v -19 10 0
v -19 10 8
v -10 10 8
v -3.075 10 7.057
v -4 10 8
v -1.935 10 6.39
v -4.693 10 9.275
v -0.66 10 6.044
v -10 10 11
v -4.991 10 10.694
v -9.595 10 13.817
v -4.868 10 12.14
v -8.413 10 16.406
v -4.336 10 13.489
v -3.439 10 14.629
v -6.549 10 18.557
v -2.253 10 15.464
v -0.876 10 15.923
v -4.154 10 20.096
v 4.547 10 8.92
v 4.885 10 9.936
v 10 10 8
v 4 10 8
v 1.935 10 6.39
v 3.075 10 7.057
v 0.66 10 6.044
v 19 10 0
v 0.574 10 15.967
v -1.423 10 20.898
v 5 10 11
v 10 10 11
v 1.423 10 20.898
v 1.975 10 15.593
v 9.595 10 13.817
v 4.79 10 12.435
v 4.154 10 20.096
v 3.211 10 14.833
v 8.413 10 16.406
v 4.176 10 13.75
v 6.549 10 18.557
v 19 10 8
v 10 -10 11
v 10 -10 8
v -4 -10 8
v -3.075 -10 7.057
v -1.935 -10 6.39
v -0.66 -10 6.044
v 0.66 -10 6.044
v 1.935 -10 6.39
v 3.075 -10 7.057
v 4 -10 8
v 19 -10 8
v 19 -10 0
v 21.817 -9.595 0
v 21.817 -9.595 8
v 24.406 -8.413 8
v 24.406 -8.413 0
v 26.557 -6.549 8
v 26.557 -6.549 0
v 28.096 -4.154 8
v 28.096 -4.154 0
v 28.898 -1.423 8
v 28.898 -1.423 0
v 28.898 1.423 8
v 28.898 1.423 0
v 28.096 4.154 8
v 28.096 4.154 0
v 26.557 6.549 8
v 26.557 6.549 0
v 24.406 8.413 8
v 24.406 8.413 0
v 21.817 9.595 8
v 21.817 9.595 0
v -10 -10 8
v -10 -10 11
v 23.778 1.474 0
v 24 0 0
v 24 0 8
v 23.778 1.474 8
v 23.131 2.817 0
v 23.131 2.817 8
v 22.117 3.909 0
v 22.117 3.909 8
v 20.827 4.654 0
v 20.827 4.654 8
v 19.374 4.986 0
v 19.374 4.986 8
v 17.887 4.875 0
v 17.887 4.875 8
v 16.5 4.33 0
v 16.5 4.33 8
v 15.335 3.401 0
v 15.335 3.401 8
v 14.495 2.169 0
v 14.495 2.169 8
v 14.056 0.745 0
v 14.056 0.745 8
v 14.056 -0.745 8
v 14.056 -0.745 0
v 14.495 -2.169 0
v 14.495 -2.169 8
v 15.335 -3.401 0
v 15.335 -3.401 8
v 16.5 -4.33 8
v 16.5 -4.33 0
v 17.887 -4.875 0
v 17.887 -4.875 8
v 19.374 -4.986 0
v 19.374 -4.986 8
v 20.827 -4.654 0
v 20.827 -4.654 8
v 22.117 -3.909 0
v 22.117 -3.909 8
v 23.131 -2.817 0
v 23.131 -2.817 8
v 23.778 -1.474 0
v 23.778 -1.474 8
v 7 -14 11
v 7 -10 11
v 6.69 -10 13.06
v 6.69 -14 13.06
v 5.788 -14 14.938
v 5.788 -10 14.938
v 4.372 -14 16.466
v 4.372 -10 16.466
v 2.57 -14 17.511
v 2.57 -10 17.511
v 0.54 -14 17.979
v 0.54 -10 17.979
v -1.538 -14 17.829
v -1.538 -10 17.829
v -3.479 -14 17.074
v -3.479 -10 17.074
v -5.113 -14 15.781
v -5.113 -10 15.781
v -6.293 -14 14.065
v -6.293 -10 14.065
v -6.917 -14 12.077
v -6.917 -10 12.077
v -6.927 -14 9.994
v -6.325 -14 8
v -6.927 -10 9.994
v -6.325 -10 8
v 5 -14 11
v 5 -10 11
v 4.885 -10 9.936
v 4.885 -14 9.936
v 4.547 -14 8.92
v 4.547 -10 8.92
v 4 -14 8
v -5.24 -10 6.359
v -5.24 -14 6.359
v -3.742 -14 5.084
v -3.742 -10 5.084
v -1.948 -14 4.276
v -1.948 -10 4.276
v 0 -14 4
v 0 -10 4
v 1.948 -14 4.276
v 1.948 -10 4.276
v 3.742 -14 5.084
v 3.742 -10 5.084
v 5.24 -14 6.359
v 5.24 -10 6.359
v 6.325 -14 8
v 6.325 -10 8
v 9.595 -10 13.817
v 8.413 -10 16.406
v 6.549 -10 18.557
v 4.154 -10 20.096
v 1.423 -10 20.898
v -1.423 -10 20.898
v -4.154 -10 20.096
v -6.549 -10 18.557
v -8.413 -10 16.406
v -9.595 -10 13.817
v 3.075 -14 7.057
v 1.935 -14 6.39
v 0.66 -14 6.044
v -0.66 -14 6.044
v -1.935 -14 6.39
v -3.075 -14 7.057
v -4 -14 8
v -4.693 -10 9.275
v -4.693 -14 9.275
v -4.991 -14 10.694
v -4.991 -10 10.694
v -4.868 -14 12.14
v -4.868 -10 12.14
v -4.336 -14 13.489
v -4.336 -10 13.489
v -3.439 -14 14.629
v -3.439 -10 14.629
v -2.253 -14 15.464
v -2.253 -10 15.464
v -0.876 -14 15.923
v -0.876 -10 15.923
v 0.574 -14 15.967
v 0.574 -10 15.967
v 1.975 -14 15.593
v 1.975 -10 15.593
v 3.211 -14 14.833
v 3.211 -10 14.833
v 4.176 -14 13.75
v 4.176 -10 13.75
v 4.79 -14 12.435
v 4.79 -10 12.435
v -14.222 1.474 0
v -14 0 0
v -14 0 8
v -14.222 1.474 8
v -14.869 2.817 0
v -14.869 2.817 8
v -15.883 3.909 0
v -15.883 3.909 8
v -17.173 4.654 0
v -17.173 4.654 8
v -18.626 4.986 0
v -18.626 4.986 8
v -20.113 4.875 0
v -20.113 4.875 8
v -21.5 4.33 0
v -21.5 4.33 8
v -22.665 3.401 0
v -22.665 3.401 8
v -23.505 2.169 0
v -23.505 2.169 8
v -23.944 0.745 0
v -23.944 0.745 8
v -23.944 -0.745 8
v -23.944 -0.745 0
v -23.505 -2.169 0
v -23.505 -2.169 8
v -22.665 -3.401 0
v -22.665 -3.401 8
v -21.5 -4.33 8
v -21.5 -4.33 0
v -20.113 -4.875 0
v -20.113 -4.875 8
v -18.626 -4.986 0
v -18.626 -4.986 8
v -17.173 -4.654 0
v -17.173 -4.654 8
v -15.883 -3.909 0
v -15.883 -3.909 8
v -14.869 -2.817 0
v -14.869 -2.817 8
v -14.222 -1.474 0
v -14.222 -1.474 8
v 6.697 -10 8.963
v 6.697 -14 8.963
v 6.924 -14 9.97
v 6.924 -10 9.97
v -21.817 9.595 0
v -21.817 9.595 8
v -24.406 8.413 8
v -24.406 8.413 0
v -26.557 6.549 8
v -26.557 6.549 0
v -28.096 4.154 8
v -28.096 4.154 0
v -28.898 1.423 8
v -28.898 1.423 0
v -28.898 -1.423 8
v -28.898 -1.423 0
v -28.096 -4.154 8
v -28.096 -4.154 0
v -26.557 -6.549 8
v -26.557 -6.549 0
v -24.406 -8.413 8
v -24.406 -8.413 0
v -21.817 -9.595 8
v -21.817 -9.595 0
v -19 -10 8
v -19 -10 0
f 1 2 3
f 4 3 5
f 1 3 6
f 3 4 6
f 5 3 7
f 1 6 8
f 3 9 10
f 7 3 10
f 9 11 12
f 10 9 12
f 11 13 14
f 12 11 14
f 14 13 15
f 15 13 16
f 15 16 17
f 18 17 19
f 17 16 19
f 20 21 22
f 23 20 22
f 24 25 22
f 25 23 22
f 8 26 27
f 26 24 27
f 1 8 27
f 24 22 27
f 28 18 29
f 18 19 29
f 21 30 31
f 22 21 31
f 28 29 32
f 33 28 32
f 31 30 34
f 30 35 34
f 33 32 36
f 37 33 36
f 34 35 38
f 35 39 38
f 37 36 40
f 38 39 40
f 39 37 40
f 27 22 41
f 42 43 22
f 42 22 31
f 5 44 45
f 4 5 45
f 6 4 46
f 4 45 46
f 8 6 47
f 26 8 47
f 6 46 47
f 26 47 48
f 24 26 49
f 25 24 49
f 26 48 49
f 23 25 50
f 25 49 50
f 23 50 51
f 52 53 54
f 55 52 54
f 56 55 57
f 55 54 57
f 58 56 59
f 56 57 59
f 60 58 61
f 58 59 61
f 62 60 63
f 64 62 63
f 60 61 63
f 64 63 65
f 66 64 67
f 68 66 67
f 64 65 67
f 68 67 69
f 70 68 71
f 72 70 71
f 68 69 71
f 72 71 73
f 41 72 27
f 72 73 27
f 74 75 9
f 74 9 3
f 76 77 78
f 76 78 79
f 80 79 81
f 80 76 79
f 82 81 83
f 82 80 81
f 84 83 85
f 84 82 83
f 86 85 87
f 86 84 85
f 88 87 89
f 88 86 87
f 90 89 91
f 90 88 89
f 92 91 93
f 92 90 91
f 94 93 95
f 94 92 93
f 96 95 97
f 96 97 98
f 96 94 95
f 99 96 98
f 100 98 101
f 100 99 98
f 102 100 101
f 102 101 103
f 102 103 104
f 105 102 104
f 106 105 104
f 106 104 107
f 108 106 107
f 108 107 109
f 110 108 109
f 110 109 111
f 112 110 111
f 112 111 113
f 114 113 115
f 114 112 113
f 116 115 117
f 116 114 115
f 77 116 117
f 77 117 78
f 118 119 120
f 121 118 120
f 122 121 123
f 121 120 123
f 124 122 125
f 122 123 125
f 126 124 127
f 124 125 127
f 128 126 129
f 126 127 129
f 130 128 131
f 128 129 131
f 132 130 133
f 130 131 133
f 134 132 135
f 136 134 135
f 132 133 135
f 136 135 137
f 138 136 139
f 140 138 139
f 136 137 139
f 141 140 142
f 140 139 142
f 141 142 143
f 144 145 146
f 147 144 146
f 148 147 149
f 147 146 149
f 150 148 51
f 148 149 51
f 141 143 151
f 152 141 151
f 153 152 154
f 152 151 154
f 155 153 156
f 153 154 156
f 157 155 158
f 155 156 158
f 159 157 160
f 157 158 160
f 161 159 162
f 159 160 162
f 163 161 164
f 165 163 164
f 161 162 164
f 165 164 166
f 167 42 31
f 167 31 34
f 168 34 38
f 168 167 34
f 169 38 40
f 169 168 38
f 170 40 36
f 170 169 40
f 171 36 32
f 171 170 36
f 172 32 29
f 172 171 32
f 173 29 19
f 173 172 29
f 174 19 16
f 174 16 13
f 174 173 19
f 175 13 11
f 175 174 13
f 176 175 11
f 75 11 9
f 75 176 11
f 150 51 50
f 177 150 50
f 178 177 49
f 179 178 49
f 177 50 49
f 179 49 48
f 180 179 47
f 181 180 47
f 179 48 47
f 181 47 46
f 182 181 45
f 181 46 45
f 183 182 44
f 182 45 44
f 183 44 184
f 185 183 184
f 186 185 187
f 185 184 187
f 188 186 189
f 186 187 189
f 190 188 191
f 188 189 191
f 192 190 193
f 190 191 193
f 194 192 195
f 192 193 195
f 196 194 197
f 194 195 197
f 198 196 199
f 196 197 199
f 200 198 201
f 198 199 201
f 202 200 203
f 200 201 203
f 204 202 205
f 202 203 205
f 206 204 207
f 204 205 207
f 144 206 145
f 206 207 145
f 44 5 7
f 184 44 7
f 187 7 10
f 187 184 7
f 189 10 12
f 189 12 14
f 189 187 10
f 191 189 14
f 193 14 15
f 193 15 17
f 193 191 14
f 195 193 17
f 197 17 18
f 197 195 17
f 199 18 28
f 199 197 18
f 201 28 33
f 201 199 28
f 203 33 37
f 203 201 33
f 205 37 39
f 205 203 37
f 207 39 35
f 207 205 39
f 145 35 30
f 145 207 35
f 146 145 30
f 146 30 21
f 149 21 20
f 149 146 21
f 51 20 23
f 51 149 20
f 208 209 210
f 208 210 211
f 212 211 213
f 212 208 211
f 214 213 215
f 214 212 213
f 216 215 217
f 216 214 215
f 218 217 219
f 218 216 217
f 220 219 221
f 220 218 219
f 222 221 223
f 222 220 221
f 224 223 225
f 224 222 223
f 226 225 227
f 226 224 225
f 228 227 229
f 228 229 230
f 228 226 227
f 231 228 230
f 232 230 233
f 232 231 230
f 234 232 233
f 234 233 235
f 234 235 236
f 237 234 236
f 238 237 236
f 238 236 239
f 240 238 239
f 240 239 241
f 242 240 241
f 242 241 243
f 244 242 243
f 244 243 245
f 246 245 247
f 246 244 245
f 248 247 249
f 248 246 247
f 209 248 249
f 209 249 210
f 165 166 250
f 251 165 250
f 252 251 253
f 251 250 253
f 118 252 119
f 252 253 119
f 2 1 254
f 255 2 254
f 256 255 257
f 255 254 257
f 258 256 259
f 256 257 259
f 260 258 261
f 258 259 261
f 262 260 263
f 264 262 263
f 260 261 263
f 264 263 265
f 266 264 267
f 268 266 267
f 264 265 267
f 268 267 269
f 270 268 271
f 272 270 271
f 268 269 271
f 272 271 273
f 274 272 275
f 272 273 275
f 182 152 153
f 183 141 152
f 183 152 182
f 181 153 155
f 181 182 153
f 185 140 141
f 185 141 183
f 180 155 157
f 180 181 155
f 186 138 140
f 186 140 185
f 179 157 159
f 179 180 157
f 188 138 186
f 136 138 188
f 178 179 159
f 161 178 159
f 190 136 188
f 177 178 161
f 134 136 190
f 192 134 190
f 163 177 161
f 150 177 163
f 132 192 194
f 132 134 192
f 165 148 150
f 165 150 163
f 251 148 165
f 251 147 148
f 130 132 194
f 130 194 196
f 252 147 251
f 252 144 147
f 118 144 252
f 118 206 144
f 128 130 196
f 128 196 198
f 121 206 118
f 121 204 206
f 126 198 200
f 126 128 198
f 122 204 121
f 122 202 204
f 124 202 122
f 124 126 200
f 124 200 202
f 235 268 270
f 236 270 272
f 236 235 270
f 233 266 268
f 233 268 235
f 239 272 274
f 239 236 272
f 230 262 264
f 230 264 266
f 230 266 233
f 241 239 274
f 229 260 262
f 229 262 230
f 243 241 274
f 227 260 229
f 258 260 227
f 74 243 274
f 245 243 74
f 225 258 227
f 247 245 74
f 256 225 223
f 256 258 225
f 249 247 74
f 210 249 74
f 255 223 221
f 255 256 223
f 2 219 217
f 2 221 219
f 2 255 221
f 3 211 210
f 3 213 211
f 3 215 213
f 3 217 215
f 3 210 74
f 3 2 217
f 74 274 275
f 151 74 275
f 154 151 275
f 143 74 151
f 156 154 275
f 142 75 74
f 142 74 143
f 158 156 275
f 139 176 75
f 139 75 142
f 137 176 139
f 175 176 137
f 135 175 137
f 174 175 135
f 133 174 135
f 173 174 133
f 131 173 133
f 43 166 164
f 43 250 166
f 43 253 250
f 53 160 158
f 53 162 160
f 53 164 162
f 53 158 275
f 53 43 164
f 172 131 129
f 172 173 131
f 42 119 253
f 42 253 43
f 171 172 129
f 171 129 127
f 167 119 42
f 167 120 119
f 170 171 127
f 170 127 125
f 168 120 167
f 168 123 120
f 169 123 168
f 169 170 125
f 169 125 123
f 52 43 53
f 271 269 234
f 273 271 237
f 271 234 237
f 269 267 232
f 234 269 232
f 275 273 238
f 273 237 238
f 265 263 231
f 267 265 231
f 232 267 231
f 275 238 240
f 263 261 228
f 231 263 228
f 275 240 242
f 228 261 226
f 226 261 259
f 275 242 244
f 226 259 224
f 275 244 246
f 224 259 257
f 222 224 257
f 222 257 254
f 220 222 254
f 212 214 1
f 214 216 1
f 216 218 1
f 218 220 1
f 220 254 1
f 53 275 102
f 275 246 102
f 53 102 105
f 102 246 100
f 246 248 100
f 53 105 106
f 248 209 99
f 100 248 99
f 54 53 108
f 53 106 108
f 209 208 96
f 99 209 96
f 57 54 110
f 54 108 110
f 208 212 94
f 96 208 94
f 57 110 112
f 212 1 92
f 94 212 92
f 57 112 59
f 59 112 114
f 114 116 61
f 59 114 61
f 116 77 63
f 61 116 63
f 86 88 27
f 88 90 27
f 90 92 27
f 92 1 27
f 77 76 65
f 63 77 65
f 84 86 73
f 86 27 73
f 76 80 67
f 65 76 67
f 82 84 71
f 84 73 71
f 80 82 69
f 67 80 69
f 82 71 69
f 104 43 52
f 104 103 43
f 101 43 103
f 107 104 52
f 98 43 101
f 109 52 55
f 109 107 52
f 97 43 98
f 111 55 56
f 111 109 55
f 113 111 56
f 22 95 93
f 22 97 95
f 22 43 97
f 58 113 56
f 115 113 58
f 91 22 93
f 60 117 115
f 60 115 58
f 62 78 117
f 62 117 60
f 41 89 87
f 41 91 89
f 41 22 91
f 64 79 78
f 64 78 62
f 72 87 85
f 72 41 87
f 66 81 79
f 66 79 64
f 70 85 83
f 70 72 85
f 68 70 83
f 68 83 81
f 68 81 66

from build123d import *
from build123d import SkipClean  # not in build123d's __all__

# Parameters (mm, degrees)
F0_R     = 5
F1_DEPTH = 8
F3_DEPTH = 20
F4_DEPTH = 20.001
F5_DEPTH = 4


with BuildPart() as f1:
    # F0 (on Top) → F1 (new body)
    with BuildSketch(Plane.XY):
        with BuildLine():
            Line((-19, -10), (19, -10))
            ThreePointArc((19, -10), (29, 0), (19, 10))
            Line((19, 10), (-19, 10))
            ThreePointArc((-19, 10), (-29, 0), (-19, -10))
        make_face()
        with Locations((-19, 0)):
            Circle(F0_R, mode=Mode.SUBTRACT)
        with Locations((19, 0)):
            Circle(F0_R, mode=Mode.SUBTRACT)
    extrude(amount=F1_DEPTH)

    # F2 (on face) → F3 (join, through all)
    with BuildSketch(Plane.XZ.offset(10)):
        with BuildLine():
            Line((-10, 11), (-10, 8))
            Line((-10, 8), (-6.3245553203, 8))
            ThreePointArc((-6.3245553203, 8), (-1.5375488216, 17.8290514437), (7, 11))
            ThreePointArc((7, 11), (6.8290514437, 9.4624511784), (6.3245553203, 8))
            Line((6.3245553203, 8), (10, 8))
            Line((10, 8), (10, 11))
            ThreePointArc((10, 11), (0, 21), (-10, 11))
        make_face()
        with BuildLine():
            Line((-4, 8), (-6.3245553203, 8))
            ThreePointArc((-6.3245553203, 8), (0, 4), (6.3245553203, 8))
            Line((6.3245553203, 8), (4, 8))
            ThreePointArc((4, 8), (0, 6), (-4, 8))
        make_face()
        with BuildLine():
            ThreePointArc((7, 11), (-1.5375488216, 17.8290514437), (-6.3245553203, 8))
            Line((-6.3245553203, 8), (-4, 8))
            ThreePointArc((-4, 8), (-1.5811388301, 15.7434164903), (5, 11))
            ThreePointArc((5, 11), (4.7434164903, 9.4188611699), (4, 8))
            Line((4, 8), (6.3245553203, 8))
            ThreePointArc((6.3245553203, 8), (6.8290514437, 9.4624511784), (7, 11))
        make_face()
    extrude(amount=-F3_DEPTH)

    # F2 (on face) → F4 (cut, through all)
    with BuildSketch(Plane.XZ.offset(10)):
        with BuildLine():
            Line((4, 8), (-4, 8))
            ThreePointArc((-4, 8), (0, 6), (4, 8))
        make_face()
    with SkipClean():  # cleaning this boolean's faces spoils the solid; the shape is the same uncleaned
        extrude(amount=-F4_DEPTH, mode=Mode.SUBTRACT)

    # F2 (on face) → F5 (join)
    with BuildSketch(Plane.XZ.offset(10)):
        with BuildLine():
            Line((-4, 8), (-6.3245553203, 8))
            ThreePointArc((-6.3245553203, 8), (0, 4), (6.3245553203, 8))
            Line((6.3245553203, 8), (4, 8))
            ThreePointArc((4, 8), (0, 6), (-4, 8))
        make_face()
        with BuildLine():
            ThreePointArc((7, 11), (-1.5375488216, 17.8290514437), (-6.3245553203, 8))
            Line((-6.3245553203, 8), (-4, 8))
            ThreePointArc((-4, 8), (-1.5811388301, 15.7434164903), (5, 11))
            ThreePointArc((5, 11), (4.7434164903, 9.4188611699), (4, 8))
            Line((4, 8), (6.3245553203, 8))
            ThreePointArc((6.3245553203, 8), (6.8290514437, 9.4624511784), (7, 11))
        make_face()
    extrude(amount=F5_DEPTH)


solid = f1.part
